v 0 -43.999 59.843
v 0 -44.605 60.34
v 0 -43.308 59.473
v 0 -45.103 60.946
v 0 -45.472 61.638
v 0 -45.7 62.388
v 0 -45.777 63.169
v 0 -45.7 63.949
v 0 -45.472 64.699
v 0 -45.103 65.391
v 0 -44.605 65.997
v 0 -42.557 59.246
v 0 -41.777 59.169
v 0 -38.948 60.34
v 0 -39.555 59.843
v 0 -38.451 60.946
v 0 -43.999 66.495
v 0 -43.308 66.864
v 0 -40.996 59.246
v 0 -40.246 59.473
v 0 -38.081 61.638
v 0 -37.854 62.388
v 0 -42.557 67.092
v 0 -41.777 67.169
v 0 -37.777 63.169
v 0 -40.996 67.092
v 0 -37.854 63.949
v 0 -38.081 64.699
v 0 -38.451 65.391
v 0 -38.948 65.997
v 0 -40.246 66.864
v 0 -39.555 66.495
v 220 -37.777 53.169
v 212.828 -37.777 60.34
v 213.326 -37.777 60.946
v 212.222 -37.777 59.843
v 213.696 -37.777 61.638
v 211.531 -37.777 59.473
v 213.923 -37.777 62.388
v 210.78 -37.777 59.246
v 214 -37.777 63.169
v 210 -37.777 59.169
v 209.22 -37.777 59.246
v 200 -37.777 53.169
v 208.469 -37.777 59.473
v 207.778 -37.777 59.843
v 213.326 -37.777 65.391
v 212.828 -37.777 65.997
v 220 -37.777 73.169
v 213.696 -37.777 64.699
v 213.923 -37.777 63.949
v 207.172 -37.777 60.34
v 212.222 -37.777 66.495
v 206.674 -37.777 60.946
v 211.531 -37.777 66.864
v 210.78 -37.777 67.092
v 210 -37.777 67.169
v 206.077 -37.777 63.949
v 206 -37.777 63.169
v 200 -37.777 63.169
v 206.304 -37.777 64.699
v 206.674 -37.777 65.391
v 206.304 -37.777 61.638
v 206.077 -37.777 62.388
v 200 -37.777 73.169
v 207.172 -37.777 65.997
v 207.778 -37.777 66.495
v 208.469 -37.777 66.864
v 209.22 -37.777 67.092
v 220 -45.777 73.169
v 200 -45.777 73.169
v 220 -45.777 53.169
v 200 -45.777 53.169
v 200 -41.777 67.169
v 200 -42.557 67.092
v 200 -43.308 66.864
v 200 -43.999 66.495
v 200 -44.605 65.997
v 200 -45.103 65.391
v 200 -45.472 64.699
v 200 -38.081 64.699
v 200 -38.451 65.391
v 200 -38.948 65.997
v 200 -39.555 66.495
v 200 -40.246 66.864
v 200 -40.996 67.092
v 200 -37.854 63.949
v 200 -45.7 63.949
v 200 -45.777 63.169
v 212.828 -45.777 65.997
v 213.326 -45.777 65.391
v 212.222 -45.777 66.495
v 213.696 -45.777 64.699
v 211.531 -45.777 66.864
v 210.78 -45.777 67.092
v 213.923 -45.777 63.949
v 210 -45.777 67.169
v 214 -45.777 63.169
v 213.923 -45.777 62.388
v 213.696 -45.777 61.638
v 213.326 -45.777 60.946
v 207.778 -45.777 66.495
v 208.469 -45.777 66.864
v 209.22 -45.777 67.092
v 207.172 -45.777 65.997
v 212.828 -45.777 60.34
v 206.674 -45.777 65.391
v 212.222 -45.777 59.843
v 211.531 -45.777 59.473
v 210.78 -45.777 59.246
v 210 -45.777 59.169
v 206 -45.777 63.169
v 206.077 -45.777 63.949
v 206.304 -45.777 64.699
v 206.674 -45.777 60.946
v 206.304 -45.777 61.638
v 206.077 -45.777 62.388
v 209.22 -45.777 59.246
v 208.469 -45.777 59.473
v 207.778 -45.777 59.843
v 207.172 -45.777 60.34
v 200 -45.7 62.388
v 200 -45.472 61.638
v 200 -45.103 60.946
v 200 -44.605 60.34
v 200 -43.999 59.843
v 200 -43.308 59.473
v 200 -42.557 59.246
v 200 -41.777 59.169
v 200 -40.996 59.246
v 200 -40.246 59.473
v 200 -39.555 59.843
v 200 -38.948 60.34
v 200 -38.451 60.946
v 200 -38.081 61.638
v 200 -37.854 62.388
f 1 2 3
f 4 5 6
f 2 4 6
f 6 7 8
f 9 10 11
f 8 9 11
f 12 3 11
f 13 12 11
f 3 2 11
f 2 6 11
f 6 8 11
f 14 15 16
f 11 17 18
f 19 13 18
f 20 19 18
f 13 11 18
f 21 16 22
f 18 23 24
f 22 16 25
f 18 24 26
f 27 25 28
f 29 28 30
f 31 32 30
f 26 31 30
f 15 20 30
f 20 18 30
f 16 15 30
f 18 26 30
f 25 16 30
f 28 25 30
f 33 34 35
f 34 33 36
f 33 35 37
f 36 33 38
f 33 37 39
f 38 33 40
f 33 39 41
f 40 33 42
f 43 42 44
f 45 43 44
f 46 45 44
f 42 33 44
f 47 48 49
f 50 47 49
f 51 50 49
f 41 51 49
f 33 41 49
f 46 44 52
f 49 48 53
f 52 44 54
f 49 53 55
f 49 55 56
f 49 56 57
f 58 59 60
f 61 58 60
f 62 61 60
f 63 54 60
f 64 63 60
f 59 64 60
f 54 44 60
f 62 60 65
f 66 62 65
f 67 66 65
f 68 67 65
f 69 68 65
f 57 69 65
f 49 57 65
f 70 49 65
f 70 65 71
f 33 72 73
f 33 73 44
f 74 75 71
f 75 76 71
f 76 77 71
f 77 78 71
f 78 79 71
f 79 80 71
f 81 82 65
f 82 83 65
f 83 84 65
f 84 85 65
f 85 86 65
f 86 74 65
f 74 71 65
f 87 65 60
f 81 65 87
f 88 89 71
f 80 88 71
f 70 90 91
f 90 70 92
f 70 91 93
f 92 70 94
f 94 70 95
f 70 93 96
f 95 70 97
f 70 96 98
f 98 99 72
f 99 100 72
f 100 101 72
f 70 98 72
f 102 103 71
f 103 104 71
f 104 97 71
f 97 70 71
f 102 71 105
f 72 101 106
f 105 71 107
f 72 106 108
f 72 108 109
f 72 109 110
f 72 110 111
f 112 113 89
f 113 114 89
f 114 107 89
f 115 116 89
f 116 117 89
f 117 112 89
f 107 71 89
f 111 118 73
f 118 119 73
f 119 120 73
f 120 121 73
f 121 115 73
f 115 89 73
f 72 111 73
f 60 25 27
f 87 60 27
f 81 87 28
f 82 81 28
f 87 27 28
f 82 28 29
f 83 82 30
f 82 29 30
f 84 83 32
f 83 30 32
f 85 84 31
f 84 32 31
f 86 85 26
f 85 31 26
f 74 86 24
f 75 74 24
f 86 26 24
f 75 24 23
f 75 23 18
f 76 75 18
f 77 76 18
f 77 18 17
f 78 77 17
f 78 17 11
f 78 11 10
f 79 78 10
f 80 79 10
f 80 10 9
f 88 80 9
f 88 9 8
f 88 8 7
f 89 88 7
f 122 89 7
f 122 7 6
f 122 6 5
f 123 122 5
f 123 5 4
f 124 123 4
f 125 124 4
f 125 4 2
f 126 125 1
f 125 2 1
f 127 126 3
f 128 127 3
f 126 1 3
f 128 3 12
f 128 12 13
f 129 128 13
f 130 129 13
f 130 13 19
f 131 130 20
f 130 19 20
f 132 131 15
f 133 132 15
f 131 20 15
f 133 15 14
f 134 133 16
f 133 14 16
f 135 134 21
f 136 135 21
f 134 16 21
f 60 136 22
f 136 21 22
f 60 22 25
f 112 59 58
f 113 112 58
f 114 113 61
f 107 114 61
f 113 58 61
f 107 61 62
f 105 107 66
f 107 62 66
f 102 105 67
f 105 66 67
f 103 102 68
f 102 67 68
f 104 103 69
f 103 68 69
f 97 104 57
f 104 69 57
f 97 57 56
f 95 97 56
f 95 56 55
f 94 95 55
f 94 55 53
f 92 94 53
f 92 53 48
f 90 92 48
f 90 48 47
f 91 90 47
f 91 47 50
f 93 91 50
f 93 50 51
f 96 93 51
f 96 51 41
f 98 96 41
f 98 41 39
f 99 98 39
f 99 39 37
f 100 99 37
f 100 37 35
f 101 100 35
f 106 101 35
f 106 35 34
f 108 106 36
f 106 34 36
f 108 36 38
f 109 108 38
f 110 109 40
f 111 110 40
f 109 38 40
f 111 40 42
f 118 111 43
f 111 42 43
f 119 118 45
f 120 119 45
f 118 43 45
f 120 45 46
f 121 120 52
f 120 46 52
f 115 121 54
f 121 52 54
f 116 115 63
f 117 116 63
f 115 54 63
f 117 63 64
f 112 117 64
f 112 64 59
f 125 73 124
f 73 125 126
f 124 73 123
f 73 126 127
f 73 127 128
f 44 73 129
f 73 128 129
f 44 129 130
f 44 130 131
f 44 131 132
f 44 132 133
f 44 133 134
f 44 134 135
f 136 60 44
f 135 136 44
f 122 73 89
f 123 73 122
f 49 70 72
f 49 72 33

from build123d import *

# Parameters (mm, degrees)
F0_R     = 4
F1_DEPTH = 200
F3_DEPTH = 20
F4_R     = 4
F5_DEPTH = 25


with BuildPart() as f1:
    # F0 (on Right) → F1 (new body)
    with BuildSketch(Plane.YZ):
        with Locations((-41.776799, 63.168682)):
            Circle(F0_R)
    extrude(amount=F1_DEPTH)

    # F2 (on face) → F3 (join)
    with BuildSketch(Plane.YZ.offset(200)):
        with BuildLine():
            Line((-37.776799, 73.168682), (-45.776799, 73.168682))
            Line((-45.776799, 73.168682), (-45.776799, 63.168682))
            ThreePointArc((-45.776799, 63.168682), (-41.776799, 67.168682), (-37.776799, 63.168682))
            Line((-37.776799, 63.168682), (-37.776799, 73.168682))
        make_face()
        with BuildLine():
            ThreePointArc((-37.776799, 63.168682), (-41.776799, 67.168682), (-45.776799, 63.168682))
            ThreePointArc((-45.776799, 63.168682), (-41.776799, 59.168682), (-37.776799, 63.168682))
        make_face()
        with BuildLine():
            ThreePointArc((-37.776799, 63.168682), (-41.776799, 59.168682), (-45.776799, 63.168682))
            Line((-45.776799, 63.168682), (-45.776799, 53.168682))
            Line((-45.776799, 53.168682), (-37.776799, 53.168682))
            Line((-37.776799, 53.168682), (-37.776799, 63.168682))
        make_face()
    extrude(amount=F3_DEPTH)

    # F4 (on face) → F5 (cut)
    with BuildSketch(Plane(origin=(0, -37.776799, 0), x_dir=(-1, 0, 0), z_dir=(0, 1, 0))):
        with Locations((-210, 63.168682)):
            Circle(F4_R)
    extrude(amount=-F5_DEPTH, mode=Mode.SUBTRACT)


solid = f1.part
